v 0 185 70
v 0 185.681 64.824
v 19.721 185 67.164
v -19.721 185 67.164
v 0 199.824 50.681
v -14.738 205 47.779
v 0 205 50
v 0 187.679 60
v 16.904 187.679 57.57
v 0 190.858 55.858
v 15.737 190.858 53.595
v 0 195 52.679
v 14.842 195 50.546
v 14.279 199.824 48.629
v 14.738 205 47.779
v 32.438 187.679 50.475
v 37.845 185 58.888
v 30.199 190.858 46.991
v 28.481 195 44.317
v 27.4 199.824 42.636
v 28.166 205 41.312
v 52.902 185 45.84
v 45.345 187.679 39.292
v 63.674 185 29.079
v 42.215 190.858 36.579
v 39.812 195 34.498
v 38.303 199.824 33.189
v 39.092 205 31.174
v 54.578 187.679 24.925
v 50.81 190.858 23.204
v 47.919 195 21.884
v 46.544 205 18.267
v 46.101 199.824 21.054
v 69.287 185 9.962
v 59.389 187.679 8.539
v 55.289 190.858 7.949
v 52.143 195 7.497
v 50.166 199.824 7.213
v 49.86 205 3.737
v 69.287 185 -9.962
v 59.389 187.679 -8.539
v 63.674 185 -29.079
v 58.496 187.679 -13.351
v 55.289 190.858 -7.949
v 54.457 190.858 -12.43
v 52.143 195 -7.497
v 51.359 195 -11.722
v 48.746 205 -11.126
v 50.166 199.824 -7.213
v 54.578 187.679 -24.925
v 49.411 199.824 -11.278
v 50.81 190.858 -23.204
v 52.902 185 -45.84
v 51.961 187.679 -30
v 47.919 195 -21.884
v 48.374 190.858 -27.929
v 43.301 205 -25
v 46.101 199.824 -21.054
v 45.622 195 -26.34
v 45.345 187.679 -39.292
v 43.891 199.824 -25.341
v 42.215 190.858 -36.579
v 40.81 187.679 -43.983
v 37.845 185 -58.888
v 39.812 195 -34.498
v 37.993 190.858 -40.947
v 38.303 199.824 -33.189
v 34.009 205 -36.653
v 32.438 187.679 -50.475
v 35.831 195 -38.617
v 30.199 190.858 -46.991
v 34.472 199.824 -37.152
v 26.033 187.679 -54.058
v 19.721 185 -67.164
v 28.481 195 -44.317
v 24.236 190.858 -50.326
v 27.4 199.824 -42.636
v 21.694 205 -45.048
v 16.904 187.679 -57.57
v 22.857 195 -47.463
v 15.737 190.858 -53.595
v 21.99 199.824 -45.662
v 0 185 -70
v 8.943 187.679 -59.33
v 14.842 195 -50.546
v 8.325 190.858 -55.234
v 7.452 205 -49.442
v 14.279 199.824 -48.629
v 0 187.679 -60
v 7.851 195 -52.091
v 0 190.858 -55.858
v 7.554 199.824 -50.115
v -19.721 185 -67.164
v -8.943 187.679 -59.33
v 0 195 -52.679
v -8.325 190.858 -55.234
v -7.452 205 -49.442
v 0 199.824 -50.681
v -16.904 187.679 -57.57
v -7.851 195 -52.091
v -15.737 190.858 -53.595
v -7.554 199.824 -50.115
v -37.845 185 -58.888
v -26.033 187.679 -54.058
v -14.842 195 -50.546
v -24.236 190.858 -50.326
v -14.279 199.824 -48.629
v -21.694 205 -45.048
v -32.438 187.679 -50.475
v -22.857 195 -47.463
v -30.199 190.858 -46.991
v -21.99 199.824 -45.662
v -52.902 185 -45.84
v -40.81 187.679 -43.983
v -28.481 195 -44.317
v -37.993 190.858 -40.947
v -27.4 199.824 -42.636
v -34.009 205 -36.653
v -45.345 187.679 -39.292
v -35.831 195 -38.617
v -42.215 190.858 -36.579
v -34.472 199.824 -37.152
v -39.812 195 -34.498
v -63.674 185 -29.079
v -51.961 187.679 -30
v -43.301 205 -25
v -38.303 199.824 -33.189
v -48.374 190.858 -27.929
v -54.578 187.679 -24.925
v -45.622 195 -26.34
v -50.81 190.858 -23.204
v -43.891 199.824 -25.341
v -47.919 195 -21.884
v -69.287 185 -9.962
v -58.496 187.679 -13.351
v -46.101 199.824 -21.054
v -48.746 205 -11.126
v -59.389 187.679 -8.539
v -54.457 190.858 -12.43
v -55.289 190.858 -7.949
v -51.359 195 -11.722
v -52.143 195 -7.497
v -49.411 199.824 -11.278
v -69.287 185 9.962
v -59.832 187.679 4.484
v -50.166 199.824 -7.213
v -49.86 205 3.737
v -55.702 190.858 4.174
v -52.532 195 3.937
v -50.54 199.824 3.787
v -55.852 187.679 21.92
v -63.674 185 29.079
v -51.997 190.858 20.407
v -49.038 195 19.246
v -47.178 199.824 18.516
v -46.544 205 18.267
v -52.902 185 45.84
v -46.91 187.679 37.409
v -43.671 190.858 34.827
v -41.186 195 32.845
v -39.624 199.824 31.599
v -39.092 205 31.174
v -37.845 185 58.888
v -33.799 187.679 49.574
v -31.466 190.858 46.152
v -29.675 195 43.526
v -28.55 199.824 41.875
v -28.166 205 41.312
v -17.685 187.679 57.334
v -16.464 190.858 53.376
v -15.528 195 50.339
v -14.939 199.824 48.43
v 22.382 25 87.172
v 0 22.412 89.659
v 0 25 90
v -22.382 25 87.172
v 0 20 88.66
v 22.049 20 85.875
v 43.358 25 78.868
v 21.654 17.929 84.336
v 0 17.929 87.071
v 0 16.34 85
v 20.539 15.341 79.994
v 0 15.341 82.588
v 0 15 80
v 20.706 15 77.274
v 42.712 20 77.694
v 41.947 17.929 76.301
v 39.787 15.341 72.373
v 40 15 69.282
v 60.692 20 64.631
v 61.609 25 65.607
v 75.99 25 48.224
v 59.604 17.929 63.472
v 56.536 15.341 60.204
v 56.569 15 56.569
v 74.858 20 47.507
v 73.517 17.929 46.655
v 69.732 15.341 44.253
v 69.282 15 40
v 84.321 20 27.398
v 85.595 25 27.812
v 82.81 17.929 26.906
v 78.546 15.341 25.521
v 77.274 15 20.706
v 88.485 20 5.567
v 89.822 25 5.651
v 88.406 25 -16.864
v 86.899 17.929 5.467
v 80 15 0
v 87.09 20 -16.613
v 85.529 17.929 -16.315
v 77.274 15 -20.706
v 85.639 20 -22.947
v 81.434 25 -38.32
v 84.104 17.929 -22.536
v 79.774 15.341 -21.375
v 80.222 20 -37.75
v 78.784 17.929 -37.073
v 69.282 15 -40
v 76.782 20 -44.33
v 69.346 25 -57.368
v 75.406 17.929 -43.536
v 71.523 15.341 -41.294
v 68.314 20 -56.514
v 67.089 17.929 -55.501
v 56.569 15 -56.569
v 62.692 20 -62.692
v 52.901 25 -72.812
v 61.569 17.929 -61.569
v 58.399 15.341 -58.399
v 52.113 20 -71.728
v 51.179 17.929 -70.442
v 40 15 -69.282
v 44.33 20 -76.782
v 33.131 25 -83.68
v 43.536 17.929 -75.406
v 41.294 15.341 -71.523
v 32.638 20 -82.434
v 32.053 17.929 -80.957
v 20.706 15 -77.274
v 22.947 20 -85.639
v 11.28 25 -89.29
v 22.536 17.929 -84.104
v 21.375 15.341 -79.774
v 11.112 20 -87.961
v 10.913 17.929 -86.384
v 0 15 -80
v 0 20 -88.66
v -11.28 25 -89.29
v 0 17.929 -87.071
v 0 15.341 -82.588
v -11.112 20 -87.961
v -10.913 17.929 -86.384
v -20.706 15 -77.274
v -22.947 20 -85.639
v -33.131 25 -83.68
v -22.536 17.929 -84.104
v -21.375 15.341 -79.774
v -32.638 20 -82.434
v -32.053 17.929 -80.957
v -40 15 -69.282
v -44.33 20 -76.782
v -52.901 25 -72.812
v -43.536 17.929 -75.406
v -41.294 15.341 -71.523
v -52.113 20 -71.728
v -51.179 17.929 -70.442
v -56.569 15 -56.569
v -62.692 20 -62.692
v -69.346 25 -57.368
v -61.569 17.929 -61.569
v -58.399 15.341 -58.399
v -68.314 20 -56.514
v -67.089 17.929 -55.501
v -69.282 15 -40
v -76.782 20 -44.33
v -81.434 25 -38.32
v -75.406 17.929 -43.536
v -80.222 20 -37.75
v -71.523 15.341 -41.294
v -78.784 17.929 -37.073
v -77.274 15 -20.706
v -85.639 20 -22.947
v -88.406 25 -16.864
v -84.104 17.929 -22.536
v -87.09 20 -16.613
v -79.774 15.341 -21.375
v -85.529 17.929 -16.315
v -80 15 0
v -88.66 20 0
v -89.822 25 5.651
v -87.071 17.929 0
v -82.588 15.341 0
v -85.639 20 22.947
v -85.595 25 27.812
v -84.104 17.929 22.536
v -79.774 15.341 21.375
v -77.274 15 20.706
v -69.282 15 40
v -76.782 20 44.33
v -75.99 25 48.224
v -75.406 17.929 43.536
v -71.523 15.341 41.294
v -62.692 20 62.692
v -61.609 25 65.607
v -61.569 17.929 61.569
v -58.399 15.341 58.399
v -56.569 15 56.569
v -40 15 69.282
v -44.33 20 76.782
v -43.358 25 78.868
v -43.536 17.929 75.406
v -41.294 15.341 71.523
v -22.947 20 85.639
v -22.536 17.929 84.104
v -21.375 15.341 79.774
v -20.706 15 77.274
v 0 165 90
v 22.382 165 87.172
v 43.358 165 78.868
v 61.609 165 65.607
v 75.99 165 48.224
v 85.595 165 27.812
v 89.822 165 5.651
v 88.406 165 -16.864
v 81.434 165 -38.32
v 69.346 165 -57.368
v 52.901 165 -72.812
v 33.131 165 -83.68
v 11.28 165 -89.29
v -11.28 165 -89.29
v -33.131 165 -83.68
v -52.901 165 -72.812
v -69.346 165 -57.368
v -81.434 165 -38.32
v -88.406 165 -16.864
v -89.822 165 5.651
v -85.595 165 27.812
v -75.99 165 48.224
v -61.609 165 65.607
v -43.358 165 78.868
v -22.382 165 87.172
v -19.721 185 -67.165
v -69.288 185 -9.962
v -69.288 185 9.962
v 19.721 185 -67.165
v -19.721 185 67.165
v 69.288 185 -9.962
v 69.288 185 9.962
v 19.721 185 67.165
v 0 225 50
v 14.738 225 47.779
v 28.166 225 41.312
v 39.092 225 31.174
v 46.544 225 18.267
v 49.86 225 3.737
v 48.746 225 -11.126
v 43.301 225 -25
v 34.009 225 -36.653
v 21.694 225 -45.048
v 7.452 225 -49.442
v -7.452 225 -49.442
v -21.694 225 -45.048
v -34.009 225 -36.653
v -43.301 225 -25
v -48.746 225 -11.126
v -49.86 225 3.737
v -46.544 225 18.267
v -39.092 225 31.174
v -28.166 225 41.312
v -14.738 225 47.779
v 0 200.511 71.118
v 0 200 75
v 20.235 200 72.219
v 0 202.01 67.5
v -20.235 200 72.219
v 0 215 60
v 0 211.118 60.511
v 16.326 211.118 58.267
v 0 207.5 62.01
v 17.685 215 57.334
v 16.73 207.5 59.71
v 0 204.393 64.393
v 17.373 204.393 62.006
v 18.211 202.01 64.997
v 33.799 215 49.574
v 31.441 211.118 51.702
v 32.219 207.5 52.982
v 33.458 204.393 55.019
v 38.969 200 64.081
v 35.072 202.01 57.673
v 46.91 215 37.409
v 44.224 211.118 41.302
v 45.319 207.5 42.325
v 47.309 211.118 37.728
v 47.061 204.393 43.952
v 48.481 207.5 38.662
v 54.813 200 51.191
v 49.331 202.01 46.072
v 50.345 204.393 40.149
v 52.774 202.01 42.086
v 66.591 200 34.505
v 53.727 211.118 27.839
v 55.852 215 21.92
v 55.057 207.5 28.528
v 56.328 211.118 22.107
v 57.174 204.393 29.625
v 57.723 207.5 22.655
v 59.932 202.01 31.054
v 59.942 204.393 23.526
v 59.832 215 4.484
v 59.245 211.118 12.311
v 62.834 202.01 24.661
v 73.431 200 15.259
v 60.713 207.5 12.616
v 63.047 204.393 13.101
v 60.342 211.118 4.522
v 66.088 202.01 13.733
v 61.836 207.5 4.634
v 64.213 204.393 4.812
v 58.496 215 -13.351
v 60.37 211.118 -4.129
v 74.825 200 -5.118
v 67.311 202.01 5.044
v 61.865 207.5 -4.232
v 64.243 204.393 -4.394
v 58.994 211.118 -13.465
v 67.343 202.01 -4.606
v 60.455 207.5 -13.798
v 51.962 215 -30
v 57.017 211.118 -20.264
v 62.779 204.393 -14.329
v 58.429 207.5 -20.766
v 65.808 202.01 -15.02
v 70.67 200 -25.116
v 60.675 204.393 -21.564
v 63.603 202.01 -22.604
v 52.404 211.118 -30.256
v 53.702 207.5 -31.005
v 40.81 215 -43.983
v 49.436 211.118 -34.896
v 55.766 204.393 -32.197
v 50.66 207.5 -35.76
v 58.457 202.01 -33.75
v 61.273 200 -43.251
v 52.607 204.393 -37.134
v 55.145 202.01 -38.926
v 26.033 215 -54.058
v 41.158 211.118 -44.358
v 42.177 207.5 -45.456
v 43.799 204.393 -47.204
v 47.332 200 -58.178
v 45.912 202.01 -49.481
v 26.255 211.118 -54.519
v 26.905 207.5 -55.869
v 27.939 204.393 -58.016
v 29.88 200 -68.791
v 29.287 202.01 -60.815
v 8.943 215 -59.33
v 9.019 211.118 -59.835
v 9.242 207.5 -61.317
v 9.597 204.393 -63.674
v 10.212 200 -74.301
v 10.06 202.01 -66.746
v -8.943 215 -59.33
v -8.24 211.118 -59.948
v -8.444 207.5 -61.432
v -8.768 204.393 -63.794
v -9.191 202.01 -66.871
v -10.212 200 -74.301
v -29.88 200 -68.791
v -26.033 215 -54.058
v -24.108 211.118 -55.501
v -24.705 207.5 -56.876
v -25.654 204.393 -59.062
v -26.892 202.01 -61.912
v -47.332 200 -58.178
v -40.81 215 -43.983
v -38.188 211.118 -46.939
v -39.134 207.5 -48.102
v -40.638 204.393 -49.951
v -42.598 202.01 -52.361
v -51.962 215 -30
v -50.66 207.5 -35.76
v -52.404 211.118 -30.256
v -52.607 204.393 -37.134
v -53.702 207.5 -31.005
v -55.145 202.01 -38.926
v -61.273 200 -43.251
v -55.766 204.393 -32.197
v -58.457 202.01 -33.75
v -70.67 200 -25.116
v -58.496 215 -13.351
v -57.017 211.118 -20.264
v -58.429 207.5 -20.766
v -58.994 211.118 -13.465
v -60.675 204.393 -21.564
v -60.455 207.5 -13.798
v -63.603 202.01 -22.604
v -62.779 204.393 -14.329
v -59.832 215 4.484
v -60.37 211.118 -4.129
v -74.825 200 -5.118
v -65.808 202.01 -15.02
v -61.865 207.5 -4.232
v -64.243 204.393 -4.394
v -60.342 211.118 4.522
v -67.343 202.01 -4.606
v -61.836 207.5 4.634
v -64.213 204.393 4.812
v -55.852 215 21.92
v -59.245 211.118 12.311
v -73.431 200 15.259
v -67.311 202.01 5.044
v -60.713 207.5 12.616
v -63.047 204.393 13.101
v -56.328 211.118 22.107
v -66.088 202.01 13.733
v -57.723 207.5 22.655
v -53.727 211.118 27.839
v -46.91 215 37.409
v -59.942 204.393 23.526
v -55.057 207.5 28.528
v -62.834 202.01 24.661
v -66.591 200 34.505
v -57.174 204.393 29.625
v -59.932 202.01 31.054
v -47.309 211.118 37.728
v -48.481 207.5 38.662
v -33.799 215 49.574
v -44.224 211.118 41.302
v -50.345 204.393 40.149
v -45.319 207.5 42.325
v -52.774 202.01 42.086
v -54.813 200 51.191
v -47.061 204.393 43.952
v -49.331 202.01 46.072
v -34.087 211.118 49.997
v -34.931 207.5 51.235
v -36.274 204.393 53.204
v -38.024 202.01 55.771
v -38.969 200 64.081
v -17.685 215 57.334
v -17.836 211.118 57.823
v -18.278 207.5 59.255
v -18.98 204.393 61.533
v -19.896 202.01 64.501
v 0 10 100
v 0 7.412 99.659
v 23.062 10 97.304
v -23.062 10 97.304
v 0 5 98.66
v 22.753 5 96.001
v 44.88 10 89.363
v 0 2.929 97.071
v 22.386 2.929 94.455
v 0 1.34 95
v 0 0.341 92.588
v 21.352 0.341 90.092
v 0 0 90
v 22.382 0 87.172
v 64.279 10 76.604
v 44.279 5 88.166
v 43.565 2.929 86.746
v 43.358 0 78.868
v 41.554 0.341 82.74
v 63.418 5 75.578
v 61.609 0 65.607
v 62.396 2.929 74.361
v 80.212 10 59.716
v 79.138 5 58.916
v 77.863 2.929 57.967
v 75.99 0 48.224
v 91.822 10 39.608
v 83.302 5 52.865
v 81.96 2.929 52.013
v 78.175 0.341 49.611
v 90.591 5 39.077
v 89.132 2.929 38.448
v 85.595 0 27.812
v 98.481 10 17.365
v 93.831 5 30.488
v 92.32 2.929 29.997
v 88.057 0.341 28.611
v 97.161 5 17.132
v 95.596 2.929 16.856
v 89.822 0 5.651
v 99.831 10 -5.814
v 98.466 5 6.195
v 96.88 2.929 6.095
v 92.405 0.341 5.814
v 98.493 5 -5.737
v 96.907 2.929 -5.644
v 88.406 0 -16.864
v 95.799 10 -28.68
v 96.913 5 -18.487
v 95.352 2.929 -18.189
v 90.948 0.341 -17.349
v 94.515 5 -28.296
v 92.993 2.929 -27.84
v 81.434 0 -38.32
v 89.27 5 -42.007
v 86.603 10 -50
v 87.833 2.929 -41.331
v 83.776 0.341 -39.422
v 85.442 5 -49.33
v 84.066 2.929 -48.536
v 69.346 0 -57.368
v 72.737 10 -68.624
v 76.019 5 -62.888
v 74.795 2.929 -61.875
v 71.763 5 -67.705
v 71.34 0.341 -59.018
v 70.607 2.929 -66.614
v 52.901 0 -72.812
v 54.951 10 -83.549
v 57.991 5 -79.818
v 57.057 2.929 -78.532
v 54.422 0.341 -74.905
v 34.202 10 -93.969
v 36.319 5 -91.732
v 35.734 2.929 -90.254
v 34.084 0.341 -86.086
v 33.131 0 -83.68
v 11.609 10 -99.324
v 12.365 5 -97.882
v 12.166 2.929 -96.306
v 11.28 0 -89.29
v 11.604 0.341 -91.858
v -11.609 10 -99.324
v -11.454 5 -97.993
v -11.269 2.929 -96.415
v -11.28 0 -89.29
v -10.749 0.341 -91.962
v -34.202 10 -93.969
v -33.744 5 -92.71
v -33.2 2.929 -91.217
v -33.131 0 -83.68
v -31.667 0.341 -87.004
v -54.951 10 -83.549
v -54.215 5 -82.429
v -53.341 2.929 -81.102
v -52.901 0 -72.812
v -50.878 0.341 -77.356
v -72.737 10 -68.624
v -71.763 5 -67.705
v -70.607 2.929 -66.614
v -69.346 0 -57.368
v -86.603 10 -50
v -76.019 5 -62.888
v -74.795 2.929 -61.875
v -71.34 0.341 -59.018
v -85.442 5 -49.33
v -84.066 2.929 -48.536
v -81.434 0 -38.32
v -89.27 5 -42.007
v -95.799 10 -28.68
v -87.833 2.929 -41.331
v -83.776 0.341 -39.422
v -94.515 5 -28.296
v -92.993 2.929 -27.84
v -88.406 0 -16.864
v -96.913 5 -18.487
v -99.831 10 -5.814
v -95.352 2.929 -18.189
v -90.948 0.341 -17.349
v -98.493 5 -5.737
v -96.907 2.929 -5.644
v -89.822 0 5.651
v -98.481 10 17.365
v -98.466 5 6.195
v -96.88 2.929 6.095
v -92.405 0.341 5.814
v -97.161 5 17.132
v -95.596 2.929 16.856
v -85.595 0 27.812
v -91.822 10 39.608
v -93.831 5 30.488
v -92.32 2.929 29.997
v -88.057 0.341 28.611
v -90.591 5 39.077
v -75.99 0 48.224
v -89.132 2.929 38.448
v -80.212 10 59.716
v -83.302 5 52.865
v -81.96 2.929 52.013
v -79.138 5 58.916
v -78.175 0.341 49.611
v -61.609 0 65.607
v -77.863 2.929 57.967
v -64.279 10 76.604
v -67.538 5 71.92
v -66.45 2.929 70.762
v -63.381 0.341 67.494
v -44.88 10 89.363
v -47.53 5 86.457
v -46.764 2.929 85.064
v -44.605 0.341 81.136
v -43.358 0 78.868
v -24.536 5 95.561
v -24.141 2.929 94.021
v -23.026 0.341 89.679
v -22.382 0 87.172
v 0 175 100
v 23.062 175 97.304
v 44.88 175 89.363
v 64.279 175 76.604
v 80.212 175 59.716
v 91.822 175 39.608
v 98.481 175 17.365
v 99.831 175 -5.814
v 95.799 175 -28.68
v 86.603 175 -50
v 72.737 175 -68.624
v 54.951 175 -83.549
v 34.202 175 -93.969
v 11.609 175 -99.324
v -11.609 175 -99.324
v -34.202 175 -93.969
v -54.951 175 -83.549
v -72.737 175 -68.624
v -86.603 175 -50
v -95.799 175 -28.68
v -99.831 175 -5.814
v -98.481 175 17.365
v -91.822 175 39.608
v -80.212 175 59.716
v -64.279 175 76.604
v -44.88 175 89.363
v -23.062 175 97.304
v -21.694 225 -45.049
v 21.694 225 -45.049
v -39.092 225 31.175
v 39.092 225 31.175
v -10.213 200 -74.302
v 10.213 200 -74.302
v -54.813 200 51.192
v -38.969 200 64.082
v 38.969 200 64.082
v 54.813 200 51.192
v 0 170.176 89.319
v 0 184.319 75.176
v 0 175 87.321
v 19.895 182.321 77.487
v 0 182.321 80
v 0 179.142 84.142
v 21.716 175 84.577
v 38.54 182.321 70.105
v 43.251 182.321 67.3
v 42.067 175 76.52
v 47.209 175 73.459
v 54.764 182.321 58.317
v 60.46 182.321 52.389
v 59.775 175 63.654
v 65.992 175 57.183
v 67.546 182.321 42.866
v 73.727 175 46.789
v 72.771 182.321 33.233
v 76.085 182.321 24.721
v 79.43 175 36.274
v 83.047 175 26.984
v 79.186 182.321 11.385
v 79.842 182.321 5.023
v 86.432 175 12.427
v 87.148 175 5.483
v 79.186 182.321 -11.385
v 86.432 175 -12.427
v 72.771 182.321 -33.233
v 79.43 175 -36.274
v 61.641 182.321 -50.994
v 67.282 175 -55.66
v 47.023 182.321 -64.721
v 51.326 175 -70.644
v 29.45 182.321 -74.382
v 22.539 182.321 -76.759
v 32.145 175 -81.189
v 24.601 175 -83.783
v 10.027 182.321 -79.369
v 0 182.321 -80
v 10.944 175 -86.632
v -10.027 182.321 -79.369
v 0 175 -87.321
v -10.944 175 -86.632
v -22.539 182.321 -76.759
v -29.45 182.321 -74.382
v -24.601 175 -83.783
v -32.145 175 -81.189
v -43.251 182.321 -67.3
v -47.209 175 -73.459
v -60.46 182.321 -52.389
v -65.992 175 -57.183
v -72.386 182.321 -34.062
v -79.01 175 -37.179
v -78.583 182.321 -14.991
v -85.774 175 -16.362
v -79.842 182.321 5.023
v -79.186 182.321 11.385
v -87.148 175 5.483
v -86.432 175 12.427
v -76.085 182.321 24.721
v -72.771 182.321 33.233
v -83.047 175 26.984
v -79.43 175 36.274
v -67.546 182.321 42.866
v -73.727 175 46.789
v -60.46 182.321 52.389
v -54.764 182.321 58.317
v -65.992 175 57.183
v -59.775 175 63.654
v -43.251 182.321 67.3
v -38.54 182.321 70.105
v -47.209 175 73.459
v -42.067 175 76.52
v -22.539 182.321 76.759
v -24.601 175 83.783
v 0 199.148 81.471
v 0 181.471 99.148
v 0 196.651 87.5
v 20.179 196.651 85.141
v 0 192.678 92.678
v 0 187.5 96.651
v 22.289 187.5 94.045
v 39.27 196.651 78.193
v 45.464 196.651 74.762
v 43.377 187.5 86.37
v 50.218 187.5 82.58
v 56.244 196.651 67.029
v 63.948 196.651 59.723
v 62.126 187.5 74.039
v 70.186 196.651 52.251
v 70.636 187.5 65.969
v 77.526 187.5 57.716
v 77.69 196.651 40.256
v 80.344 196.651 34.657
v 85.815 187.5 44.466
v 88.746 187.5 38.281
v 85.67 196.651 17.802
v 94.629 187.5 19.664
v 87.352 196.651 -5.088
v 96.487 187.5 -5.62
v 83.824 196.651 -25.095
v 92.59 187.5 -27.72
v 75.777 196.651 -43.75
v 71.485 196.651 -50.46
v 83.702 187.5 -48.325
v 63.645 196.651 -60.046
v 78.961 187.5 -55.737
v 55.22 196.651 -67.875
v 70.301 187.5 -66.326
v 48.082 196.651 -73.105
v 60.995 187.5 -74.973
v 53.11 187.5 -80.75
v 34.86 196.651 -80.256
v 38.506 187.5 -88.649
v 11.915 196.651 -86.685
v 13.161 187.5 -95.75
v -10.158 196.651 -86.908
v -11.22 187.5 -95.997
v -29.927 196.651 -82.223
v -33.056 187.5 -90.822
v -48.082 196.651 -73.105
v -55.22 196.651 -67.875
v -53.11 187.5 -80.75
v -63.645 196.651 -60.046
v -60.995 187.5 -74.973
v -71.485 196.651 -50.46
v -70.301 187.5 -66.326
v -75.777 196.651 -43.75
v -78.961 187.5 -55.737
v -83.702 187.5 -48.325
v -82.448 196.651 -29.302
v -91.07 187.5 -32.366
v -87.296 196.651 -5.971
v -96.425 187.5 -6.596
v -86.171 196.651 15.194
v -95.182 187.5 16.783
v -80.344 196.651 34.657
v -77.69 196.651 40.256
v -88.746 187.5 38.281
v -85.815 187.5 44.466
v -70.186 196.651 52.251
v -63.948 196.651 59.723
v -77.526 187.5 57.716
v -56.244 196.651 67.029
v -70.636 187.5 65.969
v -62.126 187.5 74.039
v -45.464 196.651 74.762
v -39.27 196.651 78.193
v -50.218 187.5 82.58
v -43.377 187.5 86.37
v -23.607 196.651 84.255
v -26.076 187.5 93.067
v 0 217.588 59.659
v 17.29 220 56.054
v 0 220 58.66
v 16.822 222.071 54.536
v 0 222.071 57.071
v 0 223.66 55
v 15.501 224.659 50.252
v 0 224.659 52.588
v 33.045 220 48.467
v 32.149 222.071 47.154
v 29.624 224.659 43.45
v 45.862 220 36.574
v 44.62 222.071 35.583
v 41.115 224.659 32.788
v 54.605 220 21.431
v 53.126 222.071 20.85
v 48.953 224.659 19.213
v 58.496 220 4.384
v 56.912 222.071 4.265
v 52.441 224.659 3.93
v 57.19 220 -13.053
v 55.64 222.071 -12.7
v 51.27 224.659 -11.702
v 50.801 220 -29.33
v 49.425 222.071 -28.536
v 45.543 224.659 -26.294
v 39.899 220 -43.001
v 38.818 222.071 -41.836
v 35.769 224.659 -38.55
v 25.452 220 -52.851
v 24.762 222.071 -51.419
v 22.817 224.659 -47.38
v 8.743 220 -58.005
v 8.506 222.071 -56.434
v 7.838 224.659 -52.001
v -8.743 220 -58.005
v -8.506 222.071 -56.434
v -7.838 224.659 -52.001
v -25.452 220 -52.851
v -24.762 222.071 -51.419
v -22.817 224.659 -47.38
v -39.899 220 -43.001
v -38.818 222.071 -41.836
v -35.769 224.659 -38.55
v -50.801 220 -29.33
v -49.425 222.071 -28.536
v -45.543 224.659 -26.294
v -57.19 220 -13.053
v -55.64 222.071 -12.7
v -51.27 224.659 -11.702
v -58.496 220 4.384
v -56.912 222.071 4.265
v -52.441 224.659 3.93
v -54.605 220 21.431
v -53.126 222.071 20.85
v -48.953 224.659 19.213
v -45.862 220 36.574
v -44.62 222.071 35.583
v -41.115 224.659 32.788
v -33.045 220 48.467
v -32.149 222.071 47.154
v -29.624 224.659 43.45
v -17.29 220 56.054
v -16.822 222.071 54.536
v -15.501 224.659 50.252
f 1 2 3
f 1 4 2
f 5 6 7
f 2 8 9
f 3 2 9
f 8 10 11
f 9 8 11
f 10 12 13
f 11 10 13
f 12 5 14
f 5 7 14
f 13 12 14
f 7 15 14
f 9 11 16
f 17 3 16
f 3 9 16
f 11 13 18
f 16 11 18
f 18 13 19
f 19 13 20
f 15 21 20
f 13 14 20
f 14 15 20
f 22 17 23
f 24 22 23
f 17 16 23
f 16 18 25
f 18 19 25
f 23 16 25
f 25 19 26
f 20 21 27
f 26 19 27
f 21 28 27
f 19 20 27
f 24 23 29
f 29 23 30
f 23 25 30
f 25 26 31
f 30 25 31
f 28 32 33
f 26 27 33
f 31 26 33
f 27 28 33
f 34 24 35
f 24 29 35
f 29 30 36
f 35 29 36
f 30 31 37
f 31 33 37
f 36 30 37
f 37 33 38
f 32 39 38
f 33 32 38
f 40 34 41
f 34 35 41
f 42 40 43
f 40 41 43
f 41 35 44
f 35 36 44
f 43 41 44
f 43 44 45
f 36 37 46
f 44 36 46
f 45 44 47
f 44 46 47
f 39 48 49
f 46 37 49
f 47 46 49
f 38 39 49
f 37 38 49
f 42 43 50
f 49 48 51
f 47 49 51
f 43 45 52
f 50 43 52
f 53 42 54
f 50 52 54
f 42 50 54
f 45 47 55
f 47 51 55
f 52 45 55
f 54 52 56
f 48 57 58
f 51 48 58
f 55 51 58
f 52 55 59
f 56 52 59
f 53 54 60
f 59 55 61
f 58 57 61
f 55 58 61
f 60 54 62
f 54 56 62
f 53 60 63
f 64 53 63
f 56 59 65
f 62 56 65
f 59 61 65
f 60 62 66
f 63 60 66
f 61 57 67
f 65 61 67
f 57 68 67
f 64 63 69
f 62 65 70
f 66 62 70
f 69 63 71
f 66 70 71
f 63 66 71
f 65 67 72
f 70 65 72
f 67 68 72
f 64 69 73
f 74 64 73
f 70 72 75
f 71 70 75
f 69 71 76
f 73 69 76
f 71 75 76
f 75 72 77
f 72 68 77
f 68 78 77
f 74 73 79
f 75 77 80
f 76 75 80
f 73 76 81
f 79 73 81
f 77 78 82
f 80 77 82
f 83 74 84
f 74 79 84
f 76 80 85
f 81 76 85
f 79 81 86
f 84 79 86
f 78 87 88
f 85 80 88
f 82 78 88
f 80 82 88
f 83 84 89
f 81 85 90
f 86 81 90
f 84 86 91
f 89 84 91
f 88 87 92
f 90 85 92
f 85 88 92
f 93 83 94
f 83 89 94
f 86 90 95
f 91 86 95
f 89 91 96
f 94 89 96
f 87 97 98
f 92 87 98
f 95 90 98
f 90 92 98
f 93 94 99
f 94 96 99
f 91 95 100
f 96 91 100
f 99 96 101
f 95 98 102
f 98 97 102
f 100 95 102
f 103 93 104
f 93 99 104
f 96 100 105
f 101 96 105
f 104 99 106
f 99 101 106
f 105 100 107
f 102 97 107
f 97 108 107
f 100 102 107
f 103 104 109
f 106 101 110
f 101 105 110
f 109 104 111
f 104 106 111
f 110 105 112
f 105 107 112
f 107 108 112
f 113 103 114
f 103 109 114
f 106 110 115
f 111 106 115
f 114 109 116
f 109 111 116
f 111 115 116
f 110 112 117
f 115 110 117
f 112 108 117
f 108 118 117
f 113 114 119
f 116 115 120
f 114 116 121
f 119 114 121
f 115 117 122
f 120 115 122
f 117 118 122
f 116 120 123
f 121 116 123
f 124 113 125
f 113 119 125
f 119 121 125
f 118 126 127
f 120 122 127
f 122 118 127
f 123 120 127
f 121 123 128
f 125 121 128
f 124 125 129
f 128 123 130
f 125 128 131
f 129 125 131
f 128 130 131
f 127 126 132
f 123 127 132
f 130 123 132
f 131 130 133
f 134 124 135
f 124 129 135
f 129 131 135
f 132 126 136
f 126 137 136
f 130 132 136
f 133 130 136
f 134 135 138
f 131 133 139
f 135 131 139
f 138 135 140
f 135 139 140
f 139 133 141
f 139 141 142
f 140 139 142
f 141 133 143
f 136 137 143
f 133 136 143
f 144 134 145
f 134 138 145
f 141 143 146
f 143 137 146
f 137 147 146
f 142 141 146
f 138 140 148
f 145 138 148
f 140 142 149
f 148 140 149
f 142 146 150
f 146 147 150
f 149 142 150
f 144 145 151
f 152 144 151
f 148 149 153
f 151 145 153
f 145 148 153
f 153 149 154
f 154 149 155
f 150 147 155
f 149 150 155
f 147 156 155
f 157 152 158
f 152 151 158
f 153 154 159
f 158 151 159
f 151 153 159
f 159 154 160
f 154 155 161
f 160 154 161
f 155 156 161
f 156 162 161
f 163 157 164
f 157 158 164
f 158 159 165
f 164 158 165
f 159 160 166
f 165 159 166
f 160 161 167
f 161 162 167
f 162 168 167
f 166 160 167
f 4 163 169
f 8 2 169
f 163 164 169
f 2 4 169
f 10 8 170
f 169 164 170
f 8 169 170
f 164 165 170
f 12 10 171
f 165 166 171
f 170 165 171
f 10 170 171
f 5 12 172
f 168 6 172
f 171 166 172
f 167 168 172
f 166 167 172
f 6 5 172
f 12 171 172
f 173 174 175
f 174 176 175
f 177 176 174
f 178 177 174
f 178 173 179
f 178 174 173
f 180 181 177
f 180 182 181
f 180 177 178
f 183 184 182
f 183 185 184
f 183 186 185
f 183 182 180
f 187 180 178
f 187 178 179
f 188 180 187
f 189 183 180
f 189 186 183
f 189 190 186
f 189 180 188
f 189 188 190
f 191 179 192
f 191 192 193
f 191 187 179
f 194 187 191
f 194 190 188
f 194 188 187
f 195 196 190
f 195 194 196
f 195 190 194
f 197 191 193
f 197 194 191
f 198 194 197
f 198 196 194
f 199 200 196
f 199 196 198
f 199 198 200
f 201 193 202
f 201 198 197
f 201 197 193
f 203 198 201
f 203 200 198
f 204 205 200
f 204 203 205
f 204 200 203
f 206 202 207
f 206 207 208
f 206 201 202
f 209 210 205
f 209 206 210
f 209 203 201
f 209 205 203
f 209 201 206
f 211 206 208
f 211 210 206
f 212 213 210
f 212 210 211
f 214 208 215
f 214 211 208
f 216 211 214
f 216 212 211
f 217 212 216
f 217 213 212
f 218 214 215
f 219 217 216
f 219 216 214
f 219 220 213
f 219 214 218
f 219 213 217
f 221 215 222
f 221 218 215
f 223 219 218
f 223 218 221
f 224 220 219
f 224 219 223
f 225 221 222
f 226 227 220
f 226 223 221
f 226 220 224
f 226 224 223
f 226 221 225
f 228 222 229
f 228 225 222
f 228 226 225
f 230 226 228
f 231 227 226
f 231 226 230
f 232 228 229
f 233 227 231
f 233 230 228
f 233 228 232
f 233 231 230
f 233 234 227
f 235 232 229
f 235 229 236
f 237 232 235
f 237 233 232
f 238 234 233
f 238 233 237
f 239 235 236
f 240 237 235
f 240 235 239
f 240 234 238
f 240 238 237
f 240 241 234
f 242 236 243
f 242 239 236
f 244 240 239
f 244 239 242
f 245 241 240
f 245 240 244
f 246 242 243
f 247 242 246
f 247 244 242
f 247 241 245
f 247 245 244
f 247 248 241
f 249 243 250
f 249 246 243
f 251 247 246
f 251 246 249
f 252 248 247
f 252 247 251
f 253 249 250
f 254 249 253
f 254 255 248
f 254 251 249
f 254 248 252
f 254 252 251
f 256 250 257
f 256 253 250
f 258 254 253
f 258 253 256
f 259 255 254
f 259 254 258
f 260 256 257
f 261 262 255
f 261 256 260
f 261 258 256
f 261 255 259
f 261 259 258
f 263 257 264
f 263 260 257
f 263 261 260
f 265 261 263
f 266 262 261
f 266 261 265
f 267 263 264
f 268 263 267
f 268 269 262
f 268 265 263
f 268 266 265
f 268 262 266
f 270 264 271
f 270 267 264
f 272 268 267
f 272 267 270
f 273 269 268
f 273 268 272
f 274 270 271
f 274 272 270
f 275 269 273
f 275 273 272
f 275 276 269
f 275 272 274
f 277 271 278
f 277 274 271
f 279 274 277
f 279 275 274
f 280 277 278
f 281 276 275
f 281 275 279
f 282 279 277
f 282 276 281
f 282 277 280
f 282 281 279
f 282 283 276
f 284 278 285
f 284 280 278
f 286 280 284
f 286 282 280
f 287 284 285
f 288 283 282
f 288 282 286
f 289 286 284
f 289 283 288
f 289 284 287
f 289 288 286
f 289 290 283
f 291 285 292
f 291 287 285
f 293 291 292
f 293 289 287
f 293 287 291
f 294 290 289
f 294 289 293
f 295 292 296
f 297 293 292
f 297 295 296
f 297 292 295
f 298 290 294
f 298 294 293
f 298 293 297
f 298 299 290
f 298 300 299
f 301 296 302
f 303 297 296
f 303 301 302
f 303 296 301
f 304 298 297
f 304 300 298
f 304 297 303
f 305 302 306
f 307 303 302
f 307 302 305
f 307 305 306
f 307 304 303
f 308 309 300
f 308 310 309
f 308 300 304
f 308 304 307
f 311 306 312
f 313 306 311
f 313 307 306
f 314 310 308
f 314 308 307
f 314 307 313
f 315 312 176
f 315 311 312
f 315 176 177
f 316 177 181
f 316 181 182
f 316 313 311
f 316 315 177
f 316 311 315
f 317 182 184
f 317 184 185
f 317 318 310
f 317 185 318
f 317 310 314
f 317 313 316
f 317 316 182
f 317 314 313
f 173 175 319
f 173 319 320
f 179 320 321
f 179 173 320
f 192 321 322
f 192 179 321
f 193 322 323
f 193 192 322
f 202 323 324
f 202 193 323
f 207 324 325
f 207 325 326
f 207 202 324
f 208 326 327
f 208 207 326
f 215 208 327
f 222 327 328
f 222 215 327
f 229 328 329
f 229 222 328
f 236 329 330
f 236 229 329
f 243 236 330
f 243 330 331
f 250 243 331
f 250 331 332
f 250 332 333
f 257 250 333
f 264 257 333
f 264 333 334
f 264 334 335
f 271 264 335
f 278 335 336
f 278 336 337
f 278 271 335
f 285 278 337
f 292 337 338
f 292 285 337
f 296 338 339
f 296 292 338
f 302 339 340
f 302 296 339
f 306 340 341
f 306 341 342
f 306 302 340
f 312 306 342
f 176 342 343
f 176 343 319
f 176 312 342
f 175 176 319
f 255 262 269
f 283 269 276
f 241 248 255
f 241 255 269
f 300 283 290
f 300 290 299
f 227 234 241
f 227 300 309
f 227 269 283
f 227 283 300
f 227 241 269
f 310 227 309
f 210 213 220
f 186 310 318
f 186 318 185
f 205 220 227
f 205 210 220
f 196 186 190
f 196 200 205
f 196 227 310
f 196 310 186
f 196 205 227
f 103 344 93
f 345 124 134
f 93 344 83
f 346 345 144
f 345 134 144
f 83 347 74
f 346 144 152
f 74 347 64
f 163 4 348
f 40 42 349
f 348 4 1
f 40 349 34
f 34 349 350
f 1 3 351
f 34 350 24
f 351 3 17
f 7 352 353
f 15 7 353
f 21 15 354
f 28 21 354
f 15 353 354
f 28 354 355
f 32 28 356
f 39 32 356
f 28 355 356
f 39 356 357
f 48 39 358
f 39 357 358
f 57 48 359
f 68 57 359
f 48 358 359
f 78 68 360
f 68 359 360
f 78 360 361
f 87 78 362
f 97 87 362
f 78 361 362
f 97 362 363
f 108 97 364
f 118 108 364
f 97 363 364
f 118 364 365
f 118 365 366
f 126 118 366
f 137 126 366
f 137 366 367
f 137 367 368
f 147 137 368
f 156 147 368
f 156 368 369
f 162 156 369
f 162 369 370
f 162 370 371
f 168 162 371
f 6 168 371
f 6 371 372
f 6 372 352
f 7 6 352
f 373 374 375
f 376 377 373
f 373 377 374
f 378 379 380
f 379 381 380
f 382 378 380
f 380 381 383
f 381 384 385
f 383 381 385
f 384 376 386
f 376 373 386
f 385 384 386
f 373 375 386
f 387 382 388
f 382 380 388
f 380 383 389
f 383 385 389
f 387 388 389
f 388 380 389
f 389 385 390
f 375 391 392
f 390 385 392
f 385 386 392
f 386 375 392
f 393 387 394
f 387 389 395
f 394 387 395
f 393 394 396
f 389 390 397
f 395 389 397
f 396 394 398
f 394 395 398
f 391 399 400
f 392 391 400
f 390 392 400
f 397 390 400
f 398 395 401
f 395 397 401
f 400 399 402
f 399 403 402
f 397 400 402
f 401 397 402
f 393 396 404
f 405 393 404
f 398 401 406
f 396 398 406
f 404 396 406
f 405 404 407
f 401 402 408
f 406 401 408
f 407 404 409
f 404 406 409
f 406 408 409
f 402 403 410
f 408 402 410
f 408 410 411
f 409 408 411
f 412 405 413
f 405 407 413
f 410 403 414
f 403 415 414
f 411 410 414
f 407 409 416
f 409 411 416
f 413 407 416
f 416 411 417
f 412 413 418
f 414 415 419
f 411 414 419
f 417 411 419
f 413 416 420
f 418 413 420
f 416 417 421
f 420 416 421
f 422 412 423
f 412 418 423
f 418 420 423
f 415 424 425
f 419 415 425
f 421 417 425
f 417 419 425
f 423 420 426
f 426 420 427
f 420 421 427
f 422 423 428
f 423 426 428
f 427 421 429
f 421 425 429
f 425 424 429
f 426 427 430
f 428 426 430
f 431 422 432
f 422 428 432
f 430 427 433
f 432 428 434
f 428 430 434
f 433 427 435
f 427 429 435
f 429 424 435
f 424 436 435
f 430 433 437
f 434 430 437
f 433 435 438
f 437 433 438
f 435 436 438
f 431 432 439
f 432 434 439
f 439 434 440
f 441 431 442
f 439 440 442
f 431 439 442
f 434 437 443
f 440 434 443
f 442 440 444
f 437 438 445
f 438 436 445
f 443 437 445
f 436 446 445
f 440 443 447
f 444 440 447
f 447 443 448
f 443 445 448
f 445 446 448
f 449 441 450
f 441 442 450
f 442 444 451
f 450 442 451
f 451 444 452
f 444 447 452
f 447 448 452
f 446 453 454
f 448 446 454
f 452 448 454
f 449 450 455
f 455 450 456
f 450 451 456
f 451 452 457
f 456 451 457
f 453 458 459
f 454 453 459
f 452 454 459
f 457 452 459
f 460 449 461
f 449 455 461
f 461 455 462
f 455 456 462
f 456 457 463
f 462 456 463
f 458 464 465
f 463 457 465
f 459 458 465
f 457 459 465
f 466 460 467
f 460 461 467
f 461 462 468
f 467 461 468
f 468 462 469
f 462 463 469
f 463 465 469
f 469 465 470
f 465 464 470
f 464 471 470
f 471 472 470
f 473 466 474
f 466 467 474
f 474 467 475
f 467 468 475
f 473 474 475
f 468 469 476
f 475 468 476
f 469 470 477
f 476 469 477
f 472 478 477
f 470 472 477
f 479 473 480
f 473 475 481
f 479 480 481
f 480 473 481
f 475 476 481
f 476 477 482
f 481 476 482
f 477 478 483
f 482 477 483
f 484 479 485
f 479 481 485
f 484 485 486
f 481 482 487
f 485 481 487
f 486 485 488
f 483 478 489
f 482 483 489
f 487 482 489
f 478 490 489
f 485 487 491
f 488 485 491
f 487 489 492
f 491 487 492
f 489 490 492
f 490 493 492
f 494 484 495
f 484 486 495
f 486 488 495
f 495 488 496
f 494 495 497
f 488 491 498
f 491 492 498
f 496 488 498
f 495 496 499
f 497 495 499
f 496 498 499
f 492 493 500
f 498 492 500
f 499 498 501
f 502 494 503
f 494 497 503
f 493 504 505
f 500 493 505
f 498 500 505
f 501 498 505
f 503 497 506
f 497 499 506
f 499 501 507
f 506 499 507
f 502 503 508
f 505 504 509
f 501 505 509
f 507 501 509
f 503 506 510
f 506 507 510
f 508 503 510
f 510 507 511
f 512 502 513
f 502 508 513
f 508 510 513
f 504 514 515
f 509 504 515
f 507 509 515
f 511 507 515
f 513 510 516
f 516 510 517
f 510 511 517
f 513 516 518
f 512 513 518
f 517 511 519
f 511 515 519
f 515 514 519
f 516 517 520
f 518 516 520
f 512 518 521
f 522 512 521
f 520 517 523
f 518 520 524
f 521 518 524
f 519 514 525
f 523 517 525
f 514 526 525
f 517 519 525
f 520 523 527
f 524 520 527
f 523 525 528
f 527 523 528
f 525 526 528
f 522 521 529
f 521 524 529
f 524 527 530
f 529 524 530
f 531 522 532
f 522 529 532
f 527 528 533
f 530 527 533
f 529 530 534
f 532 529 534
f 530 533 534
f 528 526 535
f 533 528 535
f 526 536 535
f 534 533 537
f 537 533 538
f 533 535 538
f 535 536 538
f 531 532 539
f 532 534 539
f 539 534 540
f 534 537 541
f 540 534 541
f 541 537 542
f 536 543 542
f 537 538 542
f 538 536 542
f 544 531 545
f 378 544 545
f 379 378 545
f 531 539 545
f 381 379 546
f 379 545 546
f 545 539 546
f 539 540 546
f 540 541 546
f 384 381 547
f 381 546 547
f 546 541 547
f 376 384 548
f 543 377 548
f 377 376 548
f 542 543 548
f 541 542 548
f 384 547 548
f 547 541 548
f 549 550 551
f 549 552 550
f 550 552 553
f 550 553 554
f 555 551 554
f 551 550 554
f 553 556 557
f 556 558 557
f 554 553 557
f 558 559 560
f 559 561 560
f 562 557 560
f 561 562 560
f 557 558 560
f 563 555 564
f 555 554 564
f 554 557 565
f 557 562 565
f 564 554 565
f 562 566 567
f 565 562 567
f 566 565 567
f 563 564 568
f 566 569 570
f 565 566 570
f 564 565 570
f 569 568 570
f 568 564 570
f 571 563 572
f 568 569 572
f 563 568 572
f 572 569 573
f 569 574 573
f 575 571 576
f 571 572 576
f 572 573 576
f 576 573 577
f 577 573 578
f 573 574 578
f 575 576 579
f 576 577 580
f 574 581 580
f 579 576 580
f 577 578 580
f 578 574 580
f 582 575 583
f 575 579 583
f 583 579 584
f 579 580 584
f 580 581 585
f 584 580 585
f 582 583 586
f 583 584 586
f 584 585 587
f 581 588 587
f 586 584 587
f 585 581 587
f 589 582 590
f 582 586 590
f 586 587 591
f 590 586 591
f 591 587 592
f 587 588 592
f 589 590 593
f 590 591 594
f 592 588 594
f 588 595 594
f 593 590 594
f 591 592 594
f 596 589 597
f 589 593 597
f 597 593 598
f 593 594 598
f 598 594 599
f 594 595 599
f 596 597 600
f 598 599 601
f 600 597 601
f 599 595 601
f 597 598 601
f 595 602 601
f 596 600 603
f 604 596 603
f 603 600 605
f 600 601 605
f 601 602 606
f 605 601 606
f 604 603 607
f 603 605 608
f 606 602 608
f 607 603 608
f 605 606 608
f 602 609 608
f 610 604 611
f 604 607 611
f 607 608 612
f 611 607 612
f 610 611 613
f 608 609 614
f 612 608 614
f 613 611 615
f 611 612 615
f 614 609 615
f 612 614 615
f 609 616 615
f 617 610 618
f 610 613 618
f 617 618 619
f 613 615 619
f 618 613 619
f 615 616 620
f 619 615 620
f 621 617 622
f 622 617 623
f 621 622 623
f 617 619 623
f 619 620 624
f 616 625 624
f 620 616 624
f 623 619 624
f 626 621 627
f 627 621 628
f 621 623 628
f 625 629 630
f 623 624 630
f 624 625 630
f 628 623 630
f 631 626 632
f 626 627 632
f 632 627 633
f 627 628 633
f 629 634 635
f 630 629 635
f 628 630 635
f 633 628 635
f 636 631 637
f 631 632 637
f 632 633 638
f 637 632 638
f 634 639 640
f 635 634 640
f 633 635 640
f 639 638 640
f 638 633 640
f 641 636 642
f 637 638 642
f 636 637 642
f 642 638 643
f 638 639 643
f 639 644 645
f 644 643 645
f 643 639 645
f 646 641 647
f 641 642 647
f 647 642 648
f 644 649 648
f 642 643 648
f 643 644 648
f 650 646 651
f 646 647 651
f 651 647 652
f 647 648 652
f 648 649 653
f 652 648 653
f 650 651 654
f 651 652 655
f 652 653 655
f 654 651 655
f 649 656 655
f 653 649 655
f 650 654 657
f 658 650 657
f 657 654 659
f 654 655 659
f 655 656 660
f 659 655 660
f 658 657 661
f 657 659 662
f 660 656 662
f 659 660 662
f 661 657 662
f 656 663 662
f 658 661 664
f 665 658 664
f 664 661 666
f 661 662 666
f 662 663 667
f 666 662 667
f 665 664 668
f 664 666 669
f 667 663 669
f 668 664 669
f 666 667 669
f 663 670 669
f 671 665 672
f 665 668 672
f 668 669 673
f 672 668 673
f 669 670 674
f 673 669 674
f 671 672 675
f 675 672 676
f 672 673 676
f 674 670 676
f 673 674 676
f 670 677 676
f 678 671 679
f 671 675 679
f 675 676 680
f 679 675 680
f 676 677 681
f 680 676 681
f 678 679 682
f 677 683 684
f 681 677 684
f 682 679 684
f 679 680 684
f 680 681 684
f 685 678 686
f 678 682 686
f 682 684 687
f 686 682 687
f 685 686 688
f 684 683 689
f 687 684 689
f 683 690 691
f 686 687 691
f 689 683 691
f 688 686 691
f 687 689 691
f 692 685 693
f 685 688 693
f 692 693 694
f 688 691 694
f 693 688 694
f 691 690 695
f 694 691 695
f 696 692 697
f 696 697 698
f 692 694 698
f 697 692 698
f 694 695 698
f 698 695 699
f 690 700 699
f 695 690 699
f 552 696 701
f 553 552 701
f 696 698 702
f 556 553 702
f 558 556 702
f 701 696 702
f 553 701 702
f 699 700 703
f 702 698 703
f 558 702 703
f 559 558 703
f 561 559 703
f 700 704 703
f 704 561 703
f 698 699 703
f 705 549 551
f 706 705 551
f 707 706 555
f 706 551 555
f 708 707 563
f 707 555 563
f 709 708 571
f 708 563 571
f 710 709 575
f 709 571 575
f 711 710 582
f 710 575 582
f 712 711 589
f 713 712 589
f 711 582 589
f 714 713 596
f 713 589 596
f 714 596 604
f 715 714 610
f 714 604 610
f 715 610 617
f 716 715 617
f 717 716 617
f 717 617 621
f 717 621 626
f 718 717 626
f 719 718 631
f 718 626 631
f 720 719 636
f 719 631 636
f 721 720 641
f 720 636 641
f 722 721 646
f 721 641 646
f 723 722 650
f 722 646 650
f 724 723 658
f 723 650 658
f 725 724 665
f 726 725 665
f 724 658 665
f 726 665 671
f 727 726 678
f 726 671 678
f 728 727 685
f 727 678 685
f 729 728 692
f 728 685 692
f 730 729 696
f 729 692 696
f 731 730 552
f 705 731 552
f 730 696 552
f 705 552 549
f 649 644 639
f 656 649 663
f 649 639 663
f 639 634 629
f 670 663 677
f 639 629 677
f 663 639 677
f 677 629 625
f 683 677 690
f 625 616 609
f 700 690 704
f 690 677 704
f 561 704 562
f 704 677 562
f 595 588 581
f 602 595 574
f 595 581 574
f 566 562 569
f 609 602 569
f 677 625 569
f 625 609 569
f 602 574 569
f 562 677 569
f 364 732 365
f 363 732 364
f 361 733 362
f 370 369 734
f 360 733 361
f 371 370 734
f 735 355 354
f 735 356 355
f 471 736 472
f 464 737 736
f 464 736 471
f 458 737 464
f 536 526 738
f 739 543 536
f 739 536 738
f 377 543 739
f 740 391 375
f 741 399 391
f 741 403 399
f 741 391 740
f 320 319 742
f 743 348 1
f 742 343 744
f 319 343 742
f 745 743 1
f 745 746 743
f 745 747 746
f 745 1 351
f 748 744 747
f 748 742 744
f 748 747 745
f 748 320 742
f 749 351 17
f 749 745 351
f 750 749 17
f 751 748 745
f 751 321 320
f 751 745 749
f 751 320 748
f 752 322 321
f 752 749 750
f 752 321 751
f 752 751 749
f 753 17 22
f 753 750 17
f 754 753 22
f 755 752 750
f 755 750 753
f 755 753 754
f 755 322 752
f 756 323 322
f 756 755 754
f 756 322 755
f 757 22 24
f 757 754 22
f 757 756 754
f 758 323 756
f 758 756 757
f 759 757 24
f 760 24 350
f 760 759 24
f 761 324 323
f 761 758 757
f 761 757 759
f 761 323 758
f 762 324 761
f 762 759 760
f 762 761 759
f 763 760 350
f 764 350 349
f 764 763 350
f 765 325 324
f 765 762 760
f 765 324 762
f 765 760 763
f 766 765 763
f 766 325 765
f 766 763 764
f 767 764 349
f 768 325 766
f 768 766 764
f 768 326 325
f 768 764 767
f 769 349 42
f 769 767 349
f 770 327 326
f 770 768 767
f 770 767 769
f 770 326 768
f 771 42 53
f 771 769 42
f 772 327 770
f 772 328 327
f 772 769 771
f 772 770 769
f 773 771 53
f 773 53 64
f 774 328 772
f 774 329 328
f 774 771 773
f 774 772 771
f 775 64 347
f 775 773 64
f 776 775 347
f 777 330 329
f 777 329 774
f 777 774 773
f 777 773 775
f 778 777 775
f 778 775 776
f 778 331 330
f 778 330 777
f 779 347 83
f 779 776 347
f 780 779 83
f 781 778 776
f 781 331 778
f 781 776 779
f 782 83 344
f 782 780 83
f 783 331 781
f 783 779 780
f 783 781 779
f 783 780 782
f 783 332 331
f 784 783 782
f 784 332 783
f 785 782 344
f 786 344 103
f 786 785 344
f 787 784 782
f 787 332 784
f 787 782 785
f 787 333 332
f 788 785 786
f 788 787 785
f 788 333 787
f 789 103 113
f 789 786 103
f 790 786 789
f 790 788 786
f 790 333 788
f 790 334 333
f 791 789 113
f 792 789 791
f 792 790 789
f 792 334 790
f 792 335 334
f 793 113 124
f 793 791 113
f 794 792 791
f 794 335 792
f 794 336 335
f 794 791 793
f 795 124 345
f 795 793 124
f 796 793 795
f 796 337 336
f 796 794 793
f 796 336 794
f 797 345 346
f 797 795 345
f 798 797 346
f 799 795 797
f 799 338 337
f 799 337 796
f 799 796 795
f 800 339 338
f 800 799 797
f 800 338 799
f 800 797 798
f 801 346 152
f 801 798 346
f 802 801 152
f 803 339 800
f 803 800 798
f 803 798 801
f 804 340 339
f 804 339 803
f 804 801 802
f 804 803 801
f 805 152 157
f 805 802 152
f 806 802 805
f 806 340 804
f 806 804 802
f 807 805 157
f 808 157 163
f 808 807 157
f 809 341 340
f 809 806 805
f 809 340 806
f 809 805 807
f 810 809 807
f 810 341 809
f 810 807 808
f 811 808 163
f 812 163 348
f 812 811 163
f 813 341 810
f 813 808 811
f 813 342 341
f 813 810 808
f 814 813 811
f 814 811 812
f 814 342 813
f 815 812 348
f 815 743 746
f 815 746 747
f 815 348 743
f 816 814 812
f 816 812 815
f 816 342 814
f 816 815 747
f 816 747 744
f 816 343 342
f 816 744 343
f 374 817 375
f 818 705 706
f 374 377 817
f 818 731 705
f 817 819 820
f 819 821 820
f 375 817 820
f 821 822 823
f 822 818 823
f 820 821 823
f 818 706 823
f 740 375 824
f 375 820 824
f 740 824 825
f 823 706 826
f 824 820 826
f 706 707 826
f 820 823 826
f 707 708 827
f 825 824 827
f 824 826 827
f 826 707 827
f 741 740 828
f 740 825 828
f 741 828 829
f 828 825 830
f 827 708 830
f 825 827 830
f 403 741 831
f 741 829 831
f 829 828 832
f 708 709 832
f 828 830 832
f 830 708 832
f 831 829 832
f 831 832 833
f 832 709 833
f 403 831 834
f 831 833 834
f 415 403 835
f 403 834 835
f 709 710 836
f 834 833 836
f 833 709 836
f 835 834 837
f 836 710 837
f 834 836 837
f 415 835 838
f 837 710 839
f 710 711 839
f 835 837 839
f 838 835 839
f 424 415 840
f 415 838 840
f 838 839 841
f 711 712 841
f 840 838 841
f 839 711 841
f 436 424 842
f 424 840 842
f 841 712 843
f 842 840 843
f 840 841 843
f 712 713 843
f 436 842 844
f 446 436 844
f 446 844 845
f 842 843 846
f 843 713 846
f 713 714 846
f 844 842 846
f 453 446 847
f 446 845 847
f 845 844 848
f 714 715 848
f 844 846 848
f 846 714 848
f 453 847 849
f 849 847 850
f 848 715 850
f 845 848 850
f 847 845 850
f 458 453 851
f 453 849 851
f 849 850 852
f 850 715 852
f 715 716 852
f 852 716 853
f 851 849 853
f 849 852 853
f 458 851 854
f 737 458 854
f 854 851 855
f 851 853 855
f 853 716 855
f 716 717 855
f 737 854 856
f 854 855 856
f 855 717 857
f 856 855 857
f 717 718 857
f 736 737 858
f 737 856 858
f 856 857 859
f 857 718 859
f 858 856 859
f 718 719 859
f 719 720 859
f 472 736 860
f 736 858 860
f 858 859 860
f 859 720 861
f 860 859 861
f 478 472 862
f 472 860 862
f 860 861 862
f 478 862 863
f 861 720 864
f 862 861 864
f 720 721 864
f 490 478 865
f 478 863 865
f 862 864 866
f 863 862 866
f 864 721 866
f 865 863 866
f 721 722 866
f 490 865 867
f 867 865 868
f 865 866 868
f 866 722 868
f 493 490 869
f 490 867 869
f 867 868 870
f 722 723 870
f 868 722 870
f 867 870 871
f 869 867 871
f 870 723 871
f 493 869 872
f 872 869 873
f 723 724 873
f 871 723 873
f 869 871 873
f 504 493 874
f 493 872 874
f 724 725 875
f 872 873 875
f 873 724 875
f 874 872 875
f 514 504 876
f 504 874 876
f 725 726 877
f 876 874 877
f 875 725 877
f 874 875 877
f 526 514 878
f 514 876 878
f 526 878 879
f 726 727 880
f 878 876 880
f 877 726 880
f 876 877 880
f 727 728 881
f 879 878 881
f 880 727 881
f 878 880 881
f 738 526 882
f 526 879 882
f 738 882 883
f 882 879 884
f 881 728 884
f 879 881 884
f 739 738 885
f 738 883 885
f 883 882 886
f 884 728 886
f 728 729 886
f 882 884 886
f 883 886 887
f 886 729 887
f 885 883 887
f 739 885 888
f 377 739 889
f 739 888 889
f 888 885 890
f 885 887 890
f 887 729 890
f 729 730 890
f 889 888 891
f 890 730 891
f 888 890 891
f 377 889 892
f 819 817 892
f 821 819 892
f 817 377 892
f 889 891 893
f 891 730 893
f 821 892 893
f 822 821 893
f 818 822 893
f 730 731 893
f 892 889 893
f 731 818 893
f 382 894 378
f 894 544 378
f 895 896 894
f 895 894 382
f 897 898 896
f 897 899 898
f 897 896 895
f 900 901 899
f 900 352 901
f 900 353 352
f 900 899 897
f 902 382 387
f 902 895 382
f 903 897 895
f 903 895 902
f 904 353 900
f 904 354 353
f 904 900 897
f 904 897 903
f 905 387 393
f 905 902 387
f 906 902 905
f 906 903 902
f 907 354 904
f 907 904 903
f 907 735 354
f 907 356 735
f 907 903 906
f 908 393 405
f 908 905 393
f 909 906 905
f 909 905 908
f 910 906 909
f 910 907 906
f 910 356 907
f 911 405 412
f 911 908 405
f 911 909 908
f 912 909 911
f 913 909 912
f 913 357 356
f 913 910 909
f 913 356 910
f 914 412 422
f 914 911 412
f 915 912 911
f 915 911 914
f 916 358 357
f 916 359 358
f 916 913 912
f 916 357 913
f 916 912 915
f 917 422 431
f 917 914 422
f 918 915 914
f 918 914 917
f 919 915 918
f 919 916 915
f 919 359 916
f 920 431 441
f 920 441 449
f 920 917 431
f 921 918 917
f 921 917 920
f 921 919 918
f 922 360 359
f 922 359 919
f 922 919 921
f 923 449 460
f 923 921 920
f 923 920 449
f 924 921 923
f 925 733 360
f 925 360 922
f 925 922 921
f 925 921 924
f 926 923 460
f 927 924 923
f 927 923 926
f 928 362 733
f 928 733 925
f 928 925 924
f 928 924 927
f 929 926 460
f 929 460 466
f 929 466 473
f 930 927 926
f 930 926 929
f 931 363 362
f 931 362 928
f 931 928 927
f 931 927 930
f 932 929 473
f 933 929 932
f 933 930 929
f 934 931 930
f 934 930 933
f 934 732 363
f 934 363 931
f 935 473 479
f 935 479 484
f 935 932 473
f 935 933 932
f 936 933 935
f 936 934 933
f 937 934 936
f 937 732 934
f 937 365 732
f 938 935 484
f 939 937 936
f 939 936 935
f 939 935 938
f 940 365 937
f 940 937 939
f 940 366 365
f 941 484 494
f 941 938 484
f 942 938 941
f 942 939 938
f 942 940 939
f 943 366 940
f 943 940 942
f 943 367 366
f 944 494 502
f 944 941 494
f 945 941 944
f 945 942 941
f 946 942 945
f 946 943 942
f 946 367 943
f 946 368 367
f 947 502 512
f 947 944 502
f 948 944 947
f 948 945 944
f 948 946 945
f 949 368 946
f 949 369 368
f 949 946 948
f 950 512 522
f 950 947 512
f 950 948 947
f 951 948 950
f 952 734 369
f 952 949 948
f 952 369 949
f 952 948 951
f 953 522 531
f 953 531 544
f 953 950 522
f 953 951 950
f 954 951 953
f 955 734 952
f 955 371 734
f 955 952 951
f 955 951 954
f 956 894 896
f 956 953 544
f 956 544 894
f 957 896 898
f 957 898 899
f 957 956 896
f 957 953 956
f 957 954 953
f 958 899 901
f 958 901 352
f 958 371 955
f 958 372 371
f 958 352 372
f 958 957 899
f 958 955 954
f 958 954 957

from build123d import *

# Parameters (mm, degrees)
SKETCH1_R           = 100
BOSS_EXTRUDE2_DEPTH = 200
SKETCH4_R           = 60
BOSS_EXTRUDE5_DEPTH = 25
SKETCH5_R           = 50
CUT_EXTRUDE2_DEPTH  = 210
FILLET2_R           = 10
FILLET3_R           = 10
FILLET4_R           = 15
FILLET5_R           = 25
SKETCH6_R           = 90
CUT_EXTRUDE4_DEPTH  = 170
FILLET7_R           = 20
FILLET8_R           = 20
FILLET9_R           = 10


with BuildPart() as part:
    # Sketch1 → Boss-Extrude2 (new body)
    with BuildSketch(Plane(origin=(0, 0, 0), x_dir=(1, 0, 0), z_dir=(0, 1, 0))):
        with Locations(Location((0, 0, 0), (0, 0, 270))):
            Circle(SKETCH1_R)
    extrude(amount=BOSS_EXTRUDE2_DEPTH)

    # Sketch4 → Boss-Extrude5 (add)
    with BuildSketch(Plane(origin=(0, 200, 0), x_dir=(1, 0, 0), z_dir=(0, 1, 0))):
        with Locations(Location((0, 0, 0), (0, 0, 270))):
            Circle(SKETCH4_R)
    extrude(amount=BOSS_EXTRUDE5_DEPTH)

    # Sketch5 → Cut-Extrude2 (cut)
    with BuildSketch(Plane(origin=(0, 225, 0), x_dir=(1, 0, 0), z_dir=(0, 1, 0))):
        with Locations(Location((0, 0, 0), (0, 0, 270))):
            Circle(SKETCH5_R)
    extrude(amount=-CUT_EXTRUDE2_DEPTH, mode=Mode.SUBTRACT)

    # Fillet2
    fillet2_edges = [part.edges().sort_by_distance(p)[0] for p in [
        (0, 0, -100),
    ]]
    fillet(fillet2_edges, radius=FILLET2_R)

    # Fillet3
    fillet3_edges = [part.edges().sort_by_distance(p)[0] for p in [
        (0, 225, -60),
    ]]
    fillet(fillet3_edges, radius=FILLET3_R - 0.0001)  # a hair under: the kernel refuses the full size

    # Fillet4
    fillet4_edges = [part.edges().sort_by_distance(p)[0] for p in [
        (0, 200, -60),
    ]]
    fillet(fillet4_edges, radius=FILLET4_R)

    # Fillet5
    fillet5_edges = [part.edges().sort_by_distance(p)[0] for p in [
        (0, 200, -100),
    ]]
    fillet(fillet5_edges, radius=FILLET5_R - 0.0001)  # a hair under: the kernel refuses the full size

    # Sketch6 → Cut-Extrude4 (cut)
    with BuildSketch(Plane(origin=(0, 15, 0), x_dir=(1, 0, 0), z_dir=(0, 1, 0))):
        with Locations(Location((0, 0, 0), (0, 0, 270))):
            Circle(SKETCH6_R)
    extrude(amount=CUT_EXTRUDE4_DEPTH, mode=Mode.SUBTRACT)

    # Fillet7
    fillet7_edges = [part.edges().sort_by_distance(p)[0] for p in [
        (0, 185, -90),
    ]]
    fillet(fillet7_edges, radius=FILLET7_R)

    # Fillet8
    fillet8_edges = [part.edges().sort_by_distance(p)[0] for p in [
        (0, 185, -50),
    ]]
    fillet(fillet8_edges, radius=FILLET8_R - 0.0001)  # a hair under: the kernel refuses the full size

    # Fillet9
    fillet9_edges = [part.edges().sort_by_distance(p)[0] for p in [
        (0, 15, -90),
    ]]
    fillet(fillet9_edges, radius=FILLET9_R)


solid = part.part
